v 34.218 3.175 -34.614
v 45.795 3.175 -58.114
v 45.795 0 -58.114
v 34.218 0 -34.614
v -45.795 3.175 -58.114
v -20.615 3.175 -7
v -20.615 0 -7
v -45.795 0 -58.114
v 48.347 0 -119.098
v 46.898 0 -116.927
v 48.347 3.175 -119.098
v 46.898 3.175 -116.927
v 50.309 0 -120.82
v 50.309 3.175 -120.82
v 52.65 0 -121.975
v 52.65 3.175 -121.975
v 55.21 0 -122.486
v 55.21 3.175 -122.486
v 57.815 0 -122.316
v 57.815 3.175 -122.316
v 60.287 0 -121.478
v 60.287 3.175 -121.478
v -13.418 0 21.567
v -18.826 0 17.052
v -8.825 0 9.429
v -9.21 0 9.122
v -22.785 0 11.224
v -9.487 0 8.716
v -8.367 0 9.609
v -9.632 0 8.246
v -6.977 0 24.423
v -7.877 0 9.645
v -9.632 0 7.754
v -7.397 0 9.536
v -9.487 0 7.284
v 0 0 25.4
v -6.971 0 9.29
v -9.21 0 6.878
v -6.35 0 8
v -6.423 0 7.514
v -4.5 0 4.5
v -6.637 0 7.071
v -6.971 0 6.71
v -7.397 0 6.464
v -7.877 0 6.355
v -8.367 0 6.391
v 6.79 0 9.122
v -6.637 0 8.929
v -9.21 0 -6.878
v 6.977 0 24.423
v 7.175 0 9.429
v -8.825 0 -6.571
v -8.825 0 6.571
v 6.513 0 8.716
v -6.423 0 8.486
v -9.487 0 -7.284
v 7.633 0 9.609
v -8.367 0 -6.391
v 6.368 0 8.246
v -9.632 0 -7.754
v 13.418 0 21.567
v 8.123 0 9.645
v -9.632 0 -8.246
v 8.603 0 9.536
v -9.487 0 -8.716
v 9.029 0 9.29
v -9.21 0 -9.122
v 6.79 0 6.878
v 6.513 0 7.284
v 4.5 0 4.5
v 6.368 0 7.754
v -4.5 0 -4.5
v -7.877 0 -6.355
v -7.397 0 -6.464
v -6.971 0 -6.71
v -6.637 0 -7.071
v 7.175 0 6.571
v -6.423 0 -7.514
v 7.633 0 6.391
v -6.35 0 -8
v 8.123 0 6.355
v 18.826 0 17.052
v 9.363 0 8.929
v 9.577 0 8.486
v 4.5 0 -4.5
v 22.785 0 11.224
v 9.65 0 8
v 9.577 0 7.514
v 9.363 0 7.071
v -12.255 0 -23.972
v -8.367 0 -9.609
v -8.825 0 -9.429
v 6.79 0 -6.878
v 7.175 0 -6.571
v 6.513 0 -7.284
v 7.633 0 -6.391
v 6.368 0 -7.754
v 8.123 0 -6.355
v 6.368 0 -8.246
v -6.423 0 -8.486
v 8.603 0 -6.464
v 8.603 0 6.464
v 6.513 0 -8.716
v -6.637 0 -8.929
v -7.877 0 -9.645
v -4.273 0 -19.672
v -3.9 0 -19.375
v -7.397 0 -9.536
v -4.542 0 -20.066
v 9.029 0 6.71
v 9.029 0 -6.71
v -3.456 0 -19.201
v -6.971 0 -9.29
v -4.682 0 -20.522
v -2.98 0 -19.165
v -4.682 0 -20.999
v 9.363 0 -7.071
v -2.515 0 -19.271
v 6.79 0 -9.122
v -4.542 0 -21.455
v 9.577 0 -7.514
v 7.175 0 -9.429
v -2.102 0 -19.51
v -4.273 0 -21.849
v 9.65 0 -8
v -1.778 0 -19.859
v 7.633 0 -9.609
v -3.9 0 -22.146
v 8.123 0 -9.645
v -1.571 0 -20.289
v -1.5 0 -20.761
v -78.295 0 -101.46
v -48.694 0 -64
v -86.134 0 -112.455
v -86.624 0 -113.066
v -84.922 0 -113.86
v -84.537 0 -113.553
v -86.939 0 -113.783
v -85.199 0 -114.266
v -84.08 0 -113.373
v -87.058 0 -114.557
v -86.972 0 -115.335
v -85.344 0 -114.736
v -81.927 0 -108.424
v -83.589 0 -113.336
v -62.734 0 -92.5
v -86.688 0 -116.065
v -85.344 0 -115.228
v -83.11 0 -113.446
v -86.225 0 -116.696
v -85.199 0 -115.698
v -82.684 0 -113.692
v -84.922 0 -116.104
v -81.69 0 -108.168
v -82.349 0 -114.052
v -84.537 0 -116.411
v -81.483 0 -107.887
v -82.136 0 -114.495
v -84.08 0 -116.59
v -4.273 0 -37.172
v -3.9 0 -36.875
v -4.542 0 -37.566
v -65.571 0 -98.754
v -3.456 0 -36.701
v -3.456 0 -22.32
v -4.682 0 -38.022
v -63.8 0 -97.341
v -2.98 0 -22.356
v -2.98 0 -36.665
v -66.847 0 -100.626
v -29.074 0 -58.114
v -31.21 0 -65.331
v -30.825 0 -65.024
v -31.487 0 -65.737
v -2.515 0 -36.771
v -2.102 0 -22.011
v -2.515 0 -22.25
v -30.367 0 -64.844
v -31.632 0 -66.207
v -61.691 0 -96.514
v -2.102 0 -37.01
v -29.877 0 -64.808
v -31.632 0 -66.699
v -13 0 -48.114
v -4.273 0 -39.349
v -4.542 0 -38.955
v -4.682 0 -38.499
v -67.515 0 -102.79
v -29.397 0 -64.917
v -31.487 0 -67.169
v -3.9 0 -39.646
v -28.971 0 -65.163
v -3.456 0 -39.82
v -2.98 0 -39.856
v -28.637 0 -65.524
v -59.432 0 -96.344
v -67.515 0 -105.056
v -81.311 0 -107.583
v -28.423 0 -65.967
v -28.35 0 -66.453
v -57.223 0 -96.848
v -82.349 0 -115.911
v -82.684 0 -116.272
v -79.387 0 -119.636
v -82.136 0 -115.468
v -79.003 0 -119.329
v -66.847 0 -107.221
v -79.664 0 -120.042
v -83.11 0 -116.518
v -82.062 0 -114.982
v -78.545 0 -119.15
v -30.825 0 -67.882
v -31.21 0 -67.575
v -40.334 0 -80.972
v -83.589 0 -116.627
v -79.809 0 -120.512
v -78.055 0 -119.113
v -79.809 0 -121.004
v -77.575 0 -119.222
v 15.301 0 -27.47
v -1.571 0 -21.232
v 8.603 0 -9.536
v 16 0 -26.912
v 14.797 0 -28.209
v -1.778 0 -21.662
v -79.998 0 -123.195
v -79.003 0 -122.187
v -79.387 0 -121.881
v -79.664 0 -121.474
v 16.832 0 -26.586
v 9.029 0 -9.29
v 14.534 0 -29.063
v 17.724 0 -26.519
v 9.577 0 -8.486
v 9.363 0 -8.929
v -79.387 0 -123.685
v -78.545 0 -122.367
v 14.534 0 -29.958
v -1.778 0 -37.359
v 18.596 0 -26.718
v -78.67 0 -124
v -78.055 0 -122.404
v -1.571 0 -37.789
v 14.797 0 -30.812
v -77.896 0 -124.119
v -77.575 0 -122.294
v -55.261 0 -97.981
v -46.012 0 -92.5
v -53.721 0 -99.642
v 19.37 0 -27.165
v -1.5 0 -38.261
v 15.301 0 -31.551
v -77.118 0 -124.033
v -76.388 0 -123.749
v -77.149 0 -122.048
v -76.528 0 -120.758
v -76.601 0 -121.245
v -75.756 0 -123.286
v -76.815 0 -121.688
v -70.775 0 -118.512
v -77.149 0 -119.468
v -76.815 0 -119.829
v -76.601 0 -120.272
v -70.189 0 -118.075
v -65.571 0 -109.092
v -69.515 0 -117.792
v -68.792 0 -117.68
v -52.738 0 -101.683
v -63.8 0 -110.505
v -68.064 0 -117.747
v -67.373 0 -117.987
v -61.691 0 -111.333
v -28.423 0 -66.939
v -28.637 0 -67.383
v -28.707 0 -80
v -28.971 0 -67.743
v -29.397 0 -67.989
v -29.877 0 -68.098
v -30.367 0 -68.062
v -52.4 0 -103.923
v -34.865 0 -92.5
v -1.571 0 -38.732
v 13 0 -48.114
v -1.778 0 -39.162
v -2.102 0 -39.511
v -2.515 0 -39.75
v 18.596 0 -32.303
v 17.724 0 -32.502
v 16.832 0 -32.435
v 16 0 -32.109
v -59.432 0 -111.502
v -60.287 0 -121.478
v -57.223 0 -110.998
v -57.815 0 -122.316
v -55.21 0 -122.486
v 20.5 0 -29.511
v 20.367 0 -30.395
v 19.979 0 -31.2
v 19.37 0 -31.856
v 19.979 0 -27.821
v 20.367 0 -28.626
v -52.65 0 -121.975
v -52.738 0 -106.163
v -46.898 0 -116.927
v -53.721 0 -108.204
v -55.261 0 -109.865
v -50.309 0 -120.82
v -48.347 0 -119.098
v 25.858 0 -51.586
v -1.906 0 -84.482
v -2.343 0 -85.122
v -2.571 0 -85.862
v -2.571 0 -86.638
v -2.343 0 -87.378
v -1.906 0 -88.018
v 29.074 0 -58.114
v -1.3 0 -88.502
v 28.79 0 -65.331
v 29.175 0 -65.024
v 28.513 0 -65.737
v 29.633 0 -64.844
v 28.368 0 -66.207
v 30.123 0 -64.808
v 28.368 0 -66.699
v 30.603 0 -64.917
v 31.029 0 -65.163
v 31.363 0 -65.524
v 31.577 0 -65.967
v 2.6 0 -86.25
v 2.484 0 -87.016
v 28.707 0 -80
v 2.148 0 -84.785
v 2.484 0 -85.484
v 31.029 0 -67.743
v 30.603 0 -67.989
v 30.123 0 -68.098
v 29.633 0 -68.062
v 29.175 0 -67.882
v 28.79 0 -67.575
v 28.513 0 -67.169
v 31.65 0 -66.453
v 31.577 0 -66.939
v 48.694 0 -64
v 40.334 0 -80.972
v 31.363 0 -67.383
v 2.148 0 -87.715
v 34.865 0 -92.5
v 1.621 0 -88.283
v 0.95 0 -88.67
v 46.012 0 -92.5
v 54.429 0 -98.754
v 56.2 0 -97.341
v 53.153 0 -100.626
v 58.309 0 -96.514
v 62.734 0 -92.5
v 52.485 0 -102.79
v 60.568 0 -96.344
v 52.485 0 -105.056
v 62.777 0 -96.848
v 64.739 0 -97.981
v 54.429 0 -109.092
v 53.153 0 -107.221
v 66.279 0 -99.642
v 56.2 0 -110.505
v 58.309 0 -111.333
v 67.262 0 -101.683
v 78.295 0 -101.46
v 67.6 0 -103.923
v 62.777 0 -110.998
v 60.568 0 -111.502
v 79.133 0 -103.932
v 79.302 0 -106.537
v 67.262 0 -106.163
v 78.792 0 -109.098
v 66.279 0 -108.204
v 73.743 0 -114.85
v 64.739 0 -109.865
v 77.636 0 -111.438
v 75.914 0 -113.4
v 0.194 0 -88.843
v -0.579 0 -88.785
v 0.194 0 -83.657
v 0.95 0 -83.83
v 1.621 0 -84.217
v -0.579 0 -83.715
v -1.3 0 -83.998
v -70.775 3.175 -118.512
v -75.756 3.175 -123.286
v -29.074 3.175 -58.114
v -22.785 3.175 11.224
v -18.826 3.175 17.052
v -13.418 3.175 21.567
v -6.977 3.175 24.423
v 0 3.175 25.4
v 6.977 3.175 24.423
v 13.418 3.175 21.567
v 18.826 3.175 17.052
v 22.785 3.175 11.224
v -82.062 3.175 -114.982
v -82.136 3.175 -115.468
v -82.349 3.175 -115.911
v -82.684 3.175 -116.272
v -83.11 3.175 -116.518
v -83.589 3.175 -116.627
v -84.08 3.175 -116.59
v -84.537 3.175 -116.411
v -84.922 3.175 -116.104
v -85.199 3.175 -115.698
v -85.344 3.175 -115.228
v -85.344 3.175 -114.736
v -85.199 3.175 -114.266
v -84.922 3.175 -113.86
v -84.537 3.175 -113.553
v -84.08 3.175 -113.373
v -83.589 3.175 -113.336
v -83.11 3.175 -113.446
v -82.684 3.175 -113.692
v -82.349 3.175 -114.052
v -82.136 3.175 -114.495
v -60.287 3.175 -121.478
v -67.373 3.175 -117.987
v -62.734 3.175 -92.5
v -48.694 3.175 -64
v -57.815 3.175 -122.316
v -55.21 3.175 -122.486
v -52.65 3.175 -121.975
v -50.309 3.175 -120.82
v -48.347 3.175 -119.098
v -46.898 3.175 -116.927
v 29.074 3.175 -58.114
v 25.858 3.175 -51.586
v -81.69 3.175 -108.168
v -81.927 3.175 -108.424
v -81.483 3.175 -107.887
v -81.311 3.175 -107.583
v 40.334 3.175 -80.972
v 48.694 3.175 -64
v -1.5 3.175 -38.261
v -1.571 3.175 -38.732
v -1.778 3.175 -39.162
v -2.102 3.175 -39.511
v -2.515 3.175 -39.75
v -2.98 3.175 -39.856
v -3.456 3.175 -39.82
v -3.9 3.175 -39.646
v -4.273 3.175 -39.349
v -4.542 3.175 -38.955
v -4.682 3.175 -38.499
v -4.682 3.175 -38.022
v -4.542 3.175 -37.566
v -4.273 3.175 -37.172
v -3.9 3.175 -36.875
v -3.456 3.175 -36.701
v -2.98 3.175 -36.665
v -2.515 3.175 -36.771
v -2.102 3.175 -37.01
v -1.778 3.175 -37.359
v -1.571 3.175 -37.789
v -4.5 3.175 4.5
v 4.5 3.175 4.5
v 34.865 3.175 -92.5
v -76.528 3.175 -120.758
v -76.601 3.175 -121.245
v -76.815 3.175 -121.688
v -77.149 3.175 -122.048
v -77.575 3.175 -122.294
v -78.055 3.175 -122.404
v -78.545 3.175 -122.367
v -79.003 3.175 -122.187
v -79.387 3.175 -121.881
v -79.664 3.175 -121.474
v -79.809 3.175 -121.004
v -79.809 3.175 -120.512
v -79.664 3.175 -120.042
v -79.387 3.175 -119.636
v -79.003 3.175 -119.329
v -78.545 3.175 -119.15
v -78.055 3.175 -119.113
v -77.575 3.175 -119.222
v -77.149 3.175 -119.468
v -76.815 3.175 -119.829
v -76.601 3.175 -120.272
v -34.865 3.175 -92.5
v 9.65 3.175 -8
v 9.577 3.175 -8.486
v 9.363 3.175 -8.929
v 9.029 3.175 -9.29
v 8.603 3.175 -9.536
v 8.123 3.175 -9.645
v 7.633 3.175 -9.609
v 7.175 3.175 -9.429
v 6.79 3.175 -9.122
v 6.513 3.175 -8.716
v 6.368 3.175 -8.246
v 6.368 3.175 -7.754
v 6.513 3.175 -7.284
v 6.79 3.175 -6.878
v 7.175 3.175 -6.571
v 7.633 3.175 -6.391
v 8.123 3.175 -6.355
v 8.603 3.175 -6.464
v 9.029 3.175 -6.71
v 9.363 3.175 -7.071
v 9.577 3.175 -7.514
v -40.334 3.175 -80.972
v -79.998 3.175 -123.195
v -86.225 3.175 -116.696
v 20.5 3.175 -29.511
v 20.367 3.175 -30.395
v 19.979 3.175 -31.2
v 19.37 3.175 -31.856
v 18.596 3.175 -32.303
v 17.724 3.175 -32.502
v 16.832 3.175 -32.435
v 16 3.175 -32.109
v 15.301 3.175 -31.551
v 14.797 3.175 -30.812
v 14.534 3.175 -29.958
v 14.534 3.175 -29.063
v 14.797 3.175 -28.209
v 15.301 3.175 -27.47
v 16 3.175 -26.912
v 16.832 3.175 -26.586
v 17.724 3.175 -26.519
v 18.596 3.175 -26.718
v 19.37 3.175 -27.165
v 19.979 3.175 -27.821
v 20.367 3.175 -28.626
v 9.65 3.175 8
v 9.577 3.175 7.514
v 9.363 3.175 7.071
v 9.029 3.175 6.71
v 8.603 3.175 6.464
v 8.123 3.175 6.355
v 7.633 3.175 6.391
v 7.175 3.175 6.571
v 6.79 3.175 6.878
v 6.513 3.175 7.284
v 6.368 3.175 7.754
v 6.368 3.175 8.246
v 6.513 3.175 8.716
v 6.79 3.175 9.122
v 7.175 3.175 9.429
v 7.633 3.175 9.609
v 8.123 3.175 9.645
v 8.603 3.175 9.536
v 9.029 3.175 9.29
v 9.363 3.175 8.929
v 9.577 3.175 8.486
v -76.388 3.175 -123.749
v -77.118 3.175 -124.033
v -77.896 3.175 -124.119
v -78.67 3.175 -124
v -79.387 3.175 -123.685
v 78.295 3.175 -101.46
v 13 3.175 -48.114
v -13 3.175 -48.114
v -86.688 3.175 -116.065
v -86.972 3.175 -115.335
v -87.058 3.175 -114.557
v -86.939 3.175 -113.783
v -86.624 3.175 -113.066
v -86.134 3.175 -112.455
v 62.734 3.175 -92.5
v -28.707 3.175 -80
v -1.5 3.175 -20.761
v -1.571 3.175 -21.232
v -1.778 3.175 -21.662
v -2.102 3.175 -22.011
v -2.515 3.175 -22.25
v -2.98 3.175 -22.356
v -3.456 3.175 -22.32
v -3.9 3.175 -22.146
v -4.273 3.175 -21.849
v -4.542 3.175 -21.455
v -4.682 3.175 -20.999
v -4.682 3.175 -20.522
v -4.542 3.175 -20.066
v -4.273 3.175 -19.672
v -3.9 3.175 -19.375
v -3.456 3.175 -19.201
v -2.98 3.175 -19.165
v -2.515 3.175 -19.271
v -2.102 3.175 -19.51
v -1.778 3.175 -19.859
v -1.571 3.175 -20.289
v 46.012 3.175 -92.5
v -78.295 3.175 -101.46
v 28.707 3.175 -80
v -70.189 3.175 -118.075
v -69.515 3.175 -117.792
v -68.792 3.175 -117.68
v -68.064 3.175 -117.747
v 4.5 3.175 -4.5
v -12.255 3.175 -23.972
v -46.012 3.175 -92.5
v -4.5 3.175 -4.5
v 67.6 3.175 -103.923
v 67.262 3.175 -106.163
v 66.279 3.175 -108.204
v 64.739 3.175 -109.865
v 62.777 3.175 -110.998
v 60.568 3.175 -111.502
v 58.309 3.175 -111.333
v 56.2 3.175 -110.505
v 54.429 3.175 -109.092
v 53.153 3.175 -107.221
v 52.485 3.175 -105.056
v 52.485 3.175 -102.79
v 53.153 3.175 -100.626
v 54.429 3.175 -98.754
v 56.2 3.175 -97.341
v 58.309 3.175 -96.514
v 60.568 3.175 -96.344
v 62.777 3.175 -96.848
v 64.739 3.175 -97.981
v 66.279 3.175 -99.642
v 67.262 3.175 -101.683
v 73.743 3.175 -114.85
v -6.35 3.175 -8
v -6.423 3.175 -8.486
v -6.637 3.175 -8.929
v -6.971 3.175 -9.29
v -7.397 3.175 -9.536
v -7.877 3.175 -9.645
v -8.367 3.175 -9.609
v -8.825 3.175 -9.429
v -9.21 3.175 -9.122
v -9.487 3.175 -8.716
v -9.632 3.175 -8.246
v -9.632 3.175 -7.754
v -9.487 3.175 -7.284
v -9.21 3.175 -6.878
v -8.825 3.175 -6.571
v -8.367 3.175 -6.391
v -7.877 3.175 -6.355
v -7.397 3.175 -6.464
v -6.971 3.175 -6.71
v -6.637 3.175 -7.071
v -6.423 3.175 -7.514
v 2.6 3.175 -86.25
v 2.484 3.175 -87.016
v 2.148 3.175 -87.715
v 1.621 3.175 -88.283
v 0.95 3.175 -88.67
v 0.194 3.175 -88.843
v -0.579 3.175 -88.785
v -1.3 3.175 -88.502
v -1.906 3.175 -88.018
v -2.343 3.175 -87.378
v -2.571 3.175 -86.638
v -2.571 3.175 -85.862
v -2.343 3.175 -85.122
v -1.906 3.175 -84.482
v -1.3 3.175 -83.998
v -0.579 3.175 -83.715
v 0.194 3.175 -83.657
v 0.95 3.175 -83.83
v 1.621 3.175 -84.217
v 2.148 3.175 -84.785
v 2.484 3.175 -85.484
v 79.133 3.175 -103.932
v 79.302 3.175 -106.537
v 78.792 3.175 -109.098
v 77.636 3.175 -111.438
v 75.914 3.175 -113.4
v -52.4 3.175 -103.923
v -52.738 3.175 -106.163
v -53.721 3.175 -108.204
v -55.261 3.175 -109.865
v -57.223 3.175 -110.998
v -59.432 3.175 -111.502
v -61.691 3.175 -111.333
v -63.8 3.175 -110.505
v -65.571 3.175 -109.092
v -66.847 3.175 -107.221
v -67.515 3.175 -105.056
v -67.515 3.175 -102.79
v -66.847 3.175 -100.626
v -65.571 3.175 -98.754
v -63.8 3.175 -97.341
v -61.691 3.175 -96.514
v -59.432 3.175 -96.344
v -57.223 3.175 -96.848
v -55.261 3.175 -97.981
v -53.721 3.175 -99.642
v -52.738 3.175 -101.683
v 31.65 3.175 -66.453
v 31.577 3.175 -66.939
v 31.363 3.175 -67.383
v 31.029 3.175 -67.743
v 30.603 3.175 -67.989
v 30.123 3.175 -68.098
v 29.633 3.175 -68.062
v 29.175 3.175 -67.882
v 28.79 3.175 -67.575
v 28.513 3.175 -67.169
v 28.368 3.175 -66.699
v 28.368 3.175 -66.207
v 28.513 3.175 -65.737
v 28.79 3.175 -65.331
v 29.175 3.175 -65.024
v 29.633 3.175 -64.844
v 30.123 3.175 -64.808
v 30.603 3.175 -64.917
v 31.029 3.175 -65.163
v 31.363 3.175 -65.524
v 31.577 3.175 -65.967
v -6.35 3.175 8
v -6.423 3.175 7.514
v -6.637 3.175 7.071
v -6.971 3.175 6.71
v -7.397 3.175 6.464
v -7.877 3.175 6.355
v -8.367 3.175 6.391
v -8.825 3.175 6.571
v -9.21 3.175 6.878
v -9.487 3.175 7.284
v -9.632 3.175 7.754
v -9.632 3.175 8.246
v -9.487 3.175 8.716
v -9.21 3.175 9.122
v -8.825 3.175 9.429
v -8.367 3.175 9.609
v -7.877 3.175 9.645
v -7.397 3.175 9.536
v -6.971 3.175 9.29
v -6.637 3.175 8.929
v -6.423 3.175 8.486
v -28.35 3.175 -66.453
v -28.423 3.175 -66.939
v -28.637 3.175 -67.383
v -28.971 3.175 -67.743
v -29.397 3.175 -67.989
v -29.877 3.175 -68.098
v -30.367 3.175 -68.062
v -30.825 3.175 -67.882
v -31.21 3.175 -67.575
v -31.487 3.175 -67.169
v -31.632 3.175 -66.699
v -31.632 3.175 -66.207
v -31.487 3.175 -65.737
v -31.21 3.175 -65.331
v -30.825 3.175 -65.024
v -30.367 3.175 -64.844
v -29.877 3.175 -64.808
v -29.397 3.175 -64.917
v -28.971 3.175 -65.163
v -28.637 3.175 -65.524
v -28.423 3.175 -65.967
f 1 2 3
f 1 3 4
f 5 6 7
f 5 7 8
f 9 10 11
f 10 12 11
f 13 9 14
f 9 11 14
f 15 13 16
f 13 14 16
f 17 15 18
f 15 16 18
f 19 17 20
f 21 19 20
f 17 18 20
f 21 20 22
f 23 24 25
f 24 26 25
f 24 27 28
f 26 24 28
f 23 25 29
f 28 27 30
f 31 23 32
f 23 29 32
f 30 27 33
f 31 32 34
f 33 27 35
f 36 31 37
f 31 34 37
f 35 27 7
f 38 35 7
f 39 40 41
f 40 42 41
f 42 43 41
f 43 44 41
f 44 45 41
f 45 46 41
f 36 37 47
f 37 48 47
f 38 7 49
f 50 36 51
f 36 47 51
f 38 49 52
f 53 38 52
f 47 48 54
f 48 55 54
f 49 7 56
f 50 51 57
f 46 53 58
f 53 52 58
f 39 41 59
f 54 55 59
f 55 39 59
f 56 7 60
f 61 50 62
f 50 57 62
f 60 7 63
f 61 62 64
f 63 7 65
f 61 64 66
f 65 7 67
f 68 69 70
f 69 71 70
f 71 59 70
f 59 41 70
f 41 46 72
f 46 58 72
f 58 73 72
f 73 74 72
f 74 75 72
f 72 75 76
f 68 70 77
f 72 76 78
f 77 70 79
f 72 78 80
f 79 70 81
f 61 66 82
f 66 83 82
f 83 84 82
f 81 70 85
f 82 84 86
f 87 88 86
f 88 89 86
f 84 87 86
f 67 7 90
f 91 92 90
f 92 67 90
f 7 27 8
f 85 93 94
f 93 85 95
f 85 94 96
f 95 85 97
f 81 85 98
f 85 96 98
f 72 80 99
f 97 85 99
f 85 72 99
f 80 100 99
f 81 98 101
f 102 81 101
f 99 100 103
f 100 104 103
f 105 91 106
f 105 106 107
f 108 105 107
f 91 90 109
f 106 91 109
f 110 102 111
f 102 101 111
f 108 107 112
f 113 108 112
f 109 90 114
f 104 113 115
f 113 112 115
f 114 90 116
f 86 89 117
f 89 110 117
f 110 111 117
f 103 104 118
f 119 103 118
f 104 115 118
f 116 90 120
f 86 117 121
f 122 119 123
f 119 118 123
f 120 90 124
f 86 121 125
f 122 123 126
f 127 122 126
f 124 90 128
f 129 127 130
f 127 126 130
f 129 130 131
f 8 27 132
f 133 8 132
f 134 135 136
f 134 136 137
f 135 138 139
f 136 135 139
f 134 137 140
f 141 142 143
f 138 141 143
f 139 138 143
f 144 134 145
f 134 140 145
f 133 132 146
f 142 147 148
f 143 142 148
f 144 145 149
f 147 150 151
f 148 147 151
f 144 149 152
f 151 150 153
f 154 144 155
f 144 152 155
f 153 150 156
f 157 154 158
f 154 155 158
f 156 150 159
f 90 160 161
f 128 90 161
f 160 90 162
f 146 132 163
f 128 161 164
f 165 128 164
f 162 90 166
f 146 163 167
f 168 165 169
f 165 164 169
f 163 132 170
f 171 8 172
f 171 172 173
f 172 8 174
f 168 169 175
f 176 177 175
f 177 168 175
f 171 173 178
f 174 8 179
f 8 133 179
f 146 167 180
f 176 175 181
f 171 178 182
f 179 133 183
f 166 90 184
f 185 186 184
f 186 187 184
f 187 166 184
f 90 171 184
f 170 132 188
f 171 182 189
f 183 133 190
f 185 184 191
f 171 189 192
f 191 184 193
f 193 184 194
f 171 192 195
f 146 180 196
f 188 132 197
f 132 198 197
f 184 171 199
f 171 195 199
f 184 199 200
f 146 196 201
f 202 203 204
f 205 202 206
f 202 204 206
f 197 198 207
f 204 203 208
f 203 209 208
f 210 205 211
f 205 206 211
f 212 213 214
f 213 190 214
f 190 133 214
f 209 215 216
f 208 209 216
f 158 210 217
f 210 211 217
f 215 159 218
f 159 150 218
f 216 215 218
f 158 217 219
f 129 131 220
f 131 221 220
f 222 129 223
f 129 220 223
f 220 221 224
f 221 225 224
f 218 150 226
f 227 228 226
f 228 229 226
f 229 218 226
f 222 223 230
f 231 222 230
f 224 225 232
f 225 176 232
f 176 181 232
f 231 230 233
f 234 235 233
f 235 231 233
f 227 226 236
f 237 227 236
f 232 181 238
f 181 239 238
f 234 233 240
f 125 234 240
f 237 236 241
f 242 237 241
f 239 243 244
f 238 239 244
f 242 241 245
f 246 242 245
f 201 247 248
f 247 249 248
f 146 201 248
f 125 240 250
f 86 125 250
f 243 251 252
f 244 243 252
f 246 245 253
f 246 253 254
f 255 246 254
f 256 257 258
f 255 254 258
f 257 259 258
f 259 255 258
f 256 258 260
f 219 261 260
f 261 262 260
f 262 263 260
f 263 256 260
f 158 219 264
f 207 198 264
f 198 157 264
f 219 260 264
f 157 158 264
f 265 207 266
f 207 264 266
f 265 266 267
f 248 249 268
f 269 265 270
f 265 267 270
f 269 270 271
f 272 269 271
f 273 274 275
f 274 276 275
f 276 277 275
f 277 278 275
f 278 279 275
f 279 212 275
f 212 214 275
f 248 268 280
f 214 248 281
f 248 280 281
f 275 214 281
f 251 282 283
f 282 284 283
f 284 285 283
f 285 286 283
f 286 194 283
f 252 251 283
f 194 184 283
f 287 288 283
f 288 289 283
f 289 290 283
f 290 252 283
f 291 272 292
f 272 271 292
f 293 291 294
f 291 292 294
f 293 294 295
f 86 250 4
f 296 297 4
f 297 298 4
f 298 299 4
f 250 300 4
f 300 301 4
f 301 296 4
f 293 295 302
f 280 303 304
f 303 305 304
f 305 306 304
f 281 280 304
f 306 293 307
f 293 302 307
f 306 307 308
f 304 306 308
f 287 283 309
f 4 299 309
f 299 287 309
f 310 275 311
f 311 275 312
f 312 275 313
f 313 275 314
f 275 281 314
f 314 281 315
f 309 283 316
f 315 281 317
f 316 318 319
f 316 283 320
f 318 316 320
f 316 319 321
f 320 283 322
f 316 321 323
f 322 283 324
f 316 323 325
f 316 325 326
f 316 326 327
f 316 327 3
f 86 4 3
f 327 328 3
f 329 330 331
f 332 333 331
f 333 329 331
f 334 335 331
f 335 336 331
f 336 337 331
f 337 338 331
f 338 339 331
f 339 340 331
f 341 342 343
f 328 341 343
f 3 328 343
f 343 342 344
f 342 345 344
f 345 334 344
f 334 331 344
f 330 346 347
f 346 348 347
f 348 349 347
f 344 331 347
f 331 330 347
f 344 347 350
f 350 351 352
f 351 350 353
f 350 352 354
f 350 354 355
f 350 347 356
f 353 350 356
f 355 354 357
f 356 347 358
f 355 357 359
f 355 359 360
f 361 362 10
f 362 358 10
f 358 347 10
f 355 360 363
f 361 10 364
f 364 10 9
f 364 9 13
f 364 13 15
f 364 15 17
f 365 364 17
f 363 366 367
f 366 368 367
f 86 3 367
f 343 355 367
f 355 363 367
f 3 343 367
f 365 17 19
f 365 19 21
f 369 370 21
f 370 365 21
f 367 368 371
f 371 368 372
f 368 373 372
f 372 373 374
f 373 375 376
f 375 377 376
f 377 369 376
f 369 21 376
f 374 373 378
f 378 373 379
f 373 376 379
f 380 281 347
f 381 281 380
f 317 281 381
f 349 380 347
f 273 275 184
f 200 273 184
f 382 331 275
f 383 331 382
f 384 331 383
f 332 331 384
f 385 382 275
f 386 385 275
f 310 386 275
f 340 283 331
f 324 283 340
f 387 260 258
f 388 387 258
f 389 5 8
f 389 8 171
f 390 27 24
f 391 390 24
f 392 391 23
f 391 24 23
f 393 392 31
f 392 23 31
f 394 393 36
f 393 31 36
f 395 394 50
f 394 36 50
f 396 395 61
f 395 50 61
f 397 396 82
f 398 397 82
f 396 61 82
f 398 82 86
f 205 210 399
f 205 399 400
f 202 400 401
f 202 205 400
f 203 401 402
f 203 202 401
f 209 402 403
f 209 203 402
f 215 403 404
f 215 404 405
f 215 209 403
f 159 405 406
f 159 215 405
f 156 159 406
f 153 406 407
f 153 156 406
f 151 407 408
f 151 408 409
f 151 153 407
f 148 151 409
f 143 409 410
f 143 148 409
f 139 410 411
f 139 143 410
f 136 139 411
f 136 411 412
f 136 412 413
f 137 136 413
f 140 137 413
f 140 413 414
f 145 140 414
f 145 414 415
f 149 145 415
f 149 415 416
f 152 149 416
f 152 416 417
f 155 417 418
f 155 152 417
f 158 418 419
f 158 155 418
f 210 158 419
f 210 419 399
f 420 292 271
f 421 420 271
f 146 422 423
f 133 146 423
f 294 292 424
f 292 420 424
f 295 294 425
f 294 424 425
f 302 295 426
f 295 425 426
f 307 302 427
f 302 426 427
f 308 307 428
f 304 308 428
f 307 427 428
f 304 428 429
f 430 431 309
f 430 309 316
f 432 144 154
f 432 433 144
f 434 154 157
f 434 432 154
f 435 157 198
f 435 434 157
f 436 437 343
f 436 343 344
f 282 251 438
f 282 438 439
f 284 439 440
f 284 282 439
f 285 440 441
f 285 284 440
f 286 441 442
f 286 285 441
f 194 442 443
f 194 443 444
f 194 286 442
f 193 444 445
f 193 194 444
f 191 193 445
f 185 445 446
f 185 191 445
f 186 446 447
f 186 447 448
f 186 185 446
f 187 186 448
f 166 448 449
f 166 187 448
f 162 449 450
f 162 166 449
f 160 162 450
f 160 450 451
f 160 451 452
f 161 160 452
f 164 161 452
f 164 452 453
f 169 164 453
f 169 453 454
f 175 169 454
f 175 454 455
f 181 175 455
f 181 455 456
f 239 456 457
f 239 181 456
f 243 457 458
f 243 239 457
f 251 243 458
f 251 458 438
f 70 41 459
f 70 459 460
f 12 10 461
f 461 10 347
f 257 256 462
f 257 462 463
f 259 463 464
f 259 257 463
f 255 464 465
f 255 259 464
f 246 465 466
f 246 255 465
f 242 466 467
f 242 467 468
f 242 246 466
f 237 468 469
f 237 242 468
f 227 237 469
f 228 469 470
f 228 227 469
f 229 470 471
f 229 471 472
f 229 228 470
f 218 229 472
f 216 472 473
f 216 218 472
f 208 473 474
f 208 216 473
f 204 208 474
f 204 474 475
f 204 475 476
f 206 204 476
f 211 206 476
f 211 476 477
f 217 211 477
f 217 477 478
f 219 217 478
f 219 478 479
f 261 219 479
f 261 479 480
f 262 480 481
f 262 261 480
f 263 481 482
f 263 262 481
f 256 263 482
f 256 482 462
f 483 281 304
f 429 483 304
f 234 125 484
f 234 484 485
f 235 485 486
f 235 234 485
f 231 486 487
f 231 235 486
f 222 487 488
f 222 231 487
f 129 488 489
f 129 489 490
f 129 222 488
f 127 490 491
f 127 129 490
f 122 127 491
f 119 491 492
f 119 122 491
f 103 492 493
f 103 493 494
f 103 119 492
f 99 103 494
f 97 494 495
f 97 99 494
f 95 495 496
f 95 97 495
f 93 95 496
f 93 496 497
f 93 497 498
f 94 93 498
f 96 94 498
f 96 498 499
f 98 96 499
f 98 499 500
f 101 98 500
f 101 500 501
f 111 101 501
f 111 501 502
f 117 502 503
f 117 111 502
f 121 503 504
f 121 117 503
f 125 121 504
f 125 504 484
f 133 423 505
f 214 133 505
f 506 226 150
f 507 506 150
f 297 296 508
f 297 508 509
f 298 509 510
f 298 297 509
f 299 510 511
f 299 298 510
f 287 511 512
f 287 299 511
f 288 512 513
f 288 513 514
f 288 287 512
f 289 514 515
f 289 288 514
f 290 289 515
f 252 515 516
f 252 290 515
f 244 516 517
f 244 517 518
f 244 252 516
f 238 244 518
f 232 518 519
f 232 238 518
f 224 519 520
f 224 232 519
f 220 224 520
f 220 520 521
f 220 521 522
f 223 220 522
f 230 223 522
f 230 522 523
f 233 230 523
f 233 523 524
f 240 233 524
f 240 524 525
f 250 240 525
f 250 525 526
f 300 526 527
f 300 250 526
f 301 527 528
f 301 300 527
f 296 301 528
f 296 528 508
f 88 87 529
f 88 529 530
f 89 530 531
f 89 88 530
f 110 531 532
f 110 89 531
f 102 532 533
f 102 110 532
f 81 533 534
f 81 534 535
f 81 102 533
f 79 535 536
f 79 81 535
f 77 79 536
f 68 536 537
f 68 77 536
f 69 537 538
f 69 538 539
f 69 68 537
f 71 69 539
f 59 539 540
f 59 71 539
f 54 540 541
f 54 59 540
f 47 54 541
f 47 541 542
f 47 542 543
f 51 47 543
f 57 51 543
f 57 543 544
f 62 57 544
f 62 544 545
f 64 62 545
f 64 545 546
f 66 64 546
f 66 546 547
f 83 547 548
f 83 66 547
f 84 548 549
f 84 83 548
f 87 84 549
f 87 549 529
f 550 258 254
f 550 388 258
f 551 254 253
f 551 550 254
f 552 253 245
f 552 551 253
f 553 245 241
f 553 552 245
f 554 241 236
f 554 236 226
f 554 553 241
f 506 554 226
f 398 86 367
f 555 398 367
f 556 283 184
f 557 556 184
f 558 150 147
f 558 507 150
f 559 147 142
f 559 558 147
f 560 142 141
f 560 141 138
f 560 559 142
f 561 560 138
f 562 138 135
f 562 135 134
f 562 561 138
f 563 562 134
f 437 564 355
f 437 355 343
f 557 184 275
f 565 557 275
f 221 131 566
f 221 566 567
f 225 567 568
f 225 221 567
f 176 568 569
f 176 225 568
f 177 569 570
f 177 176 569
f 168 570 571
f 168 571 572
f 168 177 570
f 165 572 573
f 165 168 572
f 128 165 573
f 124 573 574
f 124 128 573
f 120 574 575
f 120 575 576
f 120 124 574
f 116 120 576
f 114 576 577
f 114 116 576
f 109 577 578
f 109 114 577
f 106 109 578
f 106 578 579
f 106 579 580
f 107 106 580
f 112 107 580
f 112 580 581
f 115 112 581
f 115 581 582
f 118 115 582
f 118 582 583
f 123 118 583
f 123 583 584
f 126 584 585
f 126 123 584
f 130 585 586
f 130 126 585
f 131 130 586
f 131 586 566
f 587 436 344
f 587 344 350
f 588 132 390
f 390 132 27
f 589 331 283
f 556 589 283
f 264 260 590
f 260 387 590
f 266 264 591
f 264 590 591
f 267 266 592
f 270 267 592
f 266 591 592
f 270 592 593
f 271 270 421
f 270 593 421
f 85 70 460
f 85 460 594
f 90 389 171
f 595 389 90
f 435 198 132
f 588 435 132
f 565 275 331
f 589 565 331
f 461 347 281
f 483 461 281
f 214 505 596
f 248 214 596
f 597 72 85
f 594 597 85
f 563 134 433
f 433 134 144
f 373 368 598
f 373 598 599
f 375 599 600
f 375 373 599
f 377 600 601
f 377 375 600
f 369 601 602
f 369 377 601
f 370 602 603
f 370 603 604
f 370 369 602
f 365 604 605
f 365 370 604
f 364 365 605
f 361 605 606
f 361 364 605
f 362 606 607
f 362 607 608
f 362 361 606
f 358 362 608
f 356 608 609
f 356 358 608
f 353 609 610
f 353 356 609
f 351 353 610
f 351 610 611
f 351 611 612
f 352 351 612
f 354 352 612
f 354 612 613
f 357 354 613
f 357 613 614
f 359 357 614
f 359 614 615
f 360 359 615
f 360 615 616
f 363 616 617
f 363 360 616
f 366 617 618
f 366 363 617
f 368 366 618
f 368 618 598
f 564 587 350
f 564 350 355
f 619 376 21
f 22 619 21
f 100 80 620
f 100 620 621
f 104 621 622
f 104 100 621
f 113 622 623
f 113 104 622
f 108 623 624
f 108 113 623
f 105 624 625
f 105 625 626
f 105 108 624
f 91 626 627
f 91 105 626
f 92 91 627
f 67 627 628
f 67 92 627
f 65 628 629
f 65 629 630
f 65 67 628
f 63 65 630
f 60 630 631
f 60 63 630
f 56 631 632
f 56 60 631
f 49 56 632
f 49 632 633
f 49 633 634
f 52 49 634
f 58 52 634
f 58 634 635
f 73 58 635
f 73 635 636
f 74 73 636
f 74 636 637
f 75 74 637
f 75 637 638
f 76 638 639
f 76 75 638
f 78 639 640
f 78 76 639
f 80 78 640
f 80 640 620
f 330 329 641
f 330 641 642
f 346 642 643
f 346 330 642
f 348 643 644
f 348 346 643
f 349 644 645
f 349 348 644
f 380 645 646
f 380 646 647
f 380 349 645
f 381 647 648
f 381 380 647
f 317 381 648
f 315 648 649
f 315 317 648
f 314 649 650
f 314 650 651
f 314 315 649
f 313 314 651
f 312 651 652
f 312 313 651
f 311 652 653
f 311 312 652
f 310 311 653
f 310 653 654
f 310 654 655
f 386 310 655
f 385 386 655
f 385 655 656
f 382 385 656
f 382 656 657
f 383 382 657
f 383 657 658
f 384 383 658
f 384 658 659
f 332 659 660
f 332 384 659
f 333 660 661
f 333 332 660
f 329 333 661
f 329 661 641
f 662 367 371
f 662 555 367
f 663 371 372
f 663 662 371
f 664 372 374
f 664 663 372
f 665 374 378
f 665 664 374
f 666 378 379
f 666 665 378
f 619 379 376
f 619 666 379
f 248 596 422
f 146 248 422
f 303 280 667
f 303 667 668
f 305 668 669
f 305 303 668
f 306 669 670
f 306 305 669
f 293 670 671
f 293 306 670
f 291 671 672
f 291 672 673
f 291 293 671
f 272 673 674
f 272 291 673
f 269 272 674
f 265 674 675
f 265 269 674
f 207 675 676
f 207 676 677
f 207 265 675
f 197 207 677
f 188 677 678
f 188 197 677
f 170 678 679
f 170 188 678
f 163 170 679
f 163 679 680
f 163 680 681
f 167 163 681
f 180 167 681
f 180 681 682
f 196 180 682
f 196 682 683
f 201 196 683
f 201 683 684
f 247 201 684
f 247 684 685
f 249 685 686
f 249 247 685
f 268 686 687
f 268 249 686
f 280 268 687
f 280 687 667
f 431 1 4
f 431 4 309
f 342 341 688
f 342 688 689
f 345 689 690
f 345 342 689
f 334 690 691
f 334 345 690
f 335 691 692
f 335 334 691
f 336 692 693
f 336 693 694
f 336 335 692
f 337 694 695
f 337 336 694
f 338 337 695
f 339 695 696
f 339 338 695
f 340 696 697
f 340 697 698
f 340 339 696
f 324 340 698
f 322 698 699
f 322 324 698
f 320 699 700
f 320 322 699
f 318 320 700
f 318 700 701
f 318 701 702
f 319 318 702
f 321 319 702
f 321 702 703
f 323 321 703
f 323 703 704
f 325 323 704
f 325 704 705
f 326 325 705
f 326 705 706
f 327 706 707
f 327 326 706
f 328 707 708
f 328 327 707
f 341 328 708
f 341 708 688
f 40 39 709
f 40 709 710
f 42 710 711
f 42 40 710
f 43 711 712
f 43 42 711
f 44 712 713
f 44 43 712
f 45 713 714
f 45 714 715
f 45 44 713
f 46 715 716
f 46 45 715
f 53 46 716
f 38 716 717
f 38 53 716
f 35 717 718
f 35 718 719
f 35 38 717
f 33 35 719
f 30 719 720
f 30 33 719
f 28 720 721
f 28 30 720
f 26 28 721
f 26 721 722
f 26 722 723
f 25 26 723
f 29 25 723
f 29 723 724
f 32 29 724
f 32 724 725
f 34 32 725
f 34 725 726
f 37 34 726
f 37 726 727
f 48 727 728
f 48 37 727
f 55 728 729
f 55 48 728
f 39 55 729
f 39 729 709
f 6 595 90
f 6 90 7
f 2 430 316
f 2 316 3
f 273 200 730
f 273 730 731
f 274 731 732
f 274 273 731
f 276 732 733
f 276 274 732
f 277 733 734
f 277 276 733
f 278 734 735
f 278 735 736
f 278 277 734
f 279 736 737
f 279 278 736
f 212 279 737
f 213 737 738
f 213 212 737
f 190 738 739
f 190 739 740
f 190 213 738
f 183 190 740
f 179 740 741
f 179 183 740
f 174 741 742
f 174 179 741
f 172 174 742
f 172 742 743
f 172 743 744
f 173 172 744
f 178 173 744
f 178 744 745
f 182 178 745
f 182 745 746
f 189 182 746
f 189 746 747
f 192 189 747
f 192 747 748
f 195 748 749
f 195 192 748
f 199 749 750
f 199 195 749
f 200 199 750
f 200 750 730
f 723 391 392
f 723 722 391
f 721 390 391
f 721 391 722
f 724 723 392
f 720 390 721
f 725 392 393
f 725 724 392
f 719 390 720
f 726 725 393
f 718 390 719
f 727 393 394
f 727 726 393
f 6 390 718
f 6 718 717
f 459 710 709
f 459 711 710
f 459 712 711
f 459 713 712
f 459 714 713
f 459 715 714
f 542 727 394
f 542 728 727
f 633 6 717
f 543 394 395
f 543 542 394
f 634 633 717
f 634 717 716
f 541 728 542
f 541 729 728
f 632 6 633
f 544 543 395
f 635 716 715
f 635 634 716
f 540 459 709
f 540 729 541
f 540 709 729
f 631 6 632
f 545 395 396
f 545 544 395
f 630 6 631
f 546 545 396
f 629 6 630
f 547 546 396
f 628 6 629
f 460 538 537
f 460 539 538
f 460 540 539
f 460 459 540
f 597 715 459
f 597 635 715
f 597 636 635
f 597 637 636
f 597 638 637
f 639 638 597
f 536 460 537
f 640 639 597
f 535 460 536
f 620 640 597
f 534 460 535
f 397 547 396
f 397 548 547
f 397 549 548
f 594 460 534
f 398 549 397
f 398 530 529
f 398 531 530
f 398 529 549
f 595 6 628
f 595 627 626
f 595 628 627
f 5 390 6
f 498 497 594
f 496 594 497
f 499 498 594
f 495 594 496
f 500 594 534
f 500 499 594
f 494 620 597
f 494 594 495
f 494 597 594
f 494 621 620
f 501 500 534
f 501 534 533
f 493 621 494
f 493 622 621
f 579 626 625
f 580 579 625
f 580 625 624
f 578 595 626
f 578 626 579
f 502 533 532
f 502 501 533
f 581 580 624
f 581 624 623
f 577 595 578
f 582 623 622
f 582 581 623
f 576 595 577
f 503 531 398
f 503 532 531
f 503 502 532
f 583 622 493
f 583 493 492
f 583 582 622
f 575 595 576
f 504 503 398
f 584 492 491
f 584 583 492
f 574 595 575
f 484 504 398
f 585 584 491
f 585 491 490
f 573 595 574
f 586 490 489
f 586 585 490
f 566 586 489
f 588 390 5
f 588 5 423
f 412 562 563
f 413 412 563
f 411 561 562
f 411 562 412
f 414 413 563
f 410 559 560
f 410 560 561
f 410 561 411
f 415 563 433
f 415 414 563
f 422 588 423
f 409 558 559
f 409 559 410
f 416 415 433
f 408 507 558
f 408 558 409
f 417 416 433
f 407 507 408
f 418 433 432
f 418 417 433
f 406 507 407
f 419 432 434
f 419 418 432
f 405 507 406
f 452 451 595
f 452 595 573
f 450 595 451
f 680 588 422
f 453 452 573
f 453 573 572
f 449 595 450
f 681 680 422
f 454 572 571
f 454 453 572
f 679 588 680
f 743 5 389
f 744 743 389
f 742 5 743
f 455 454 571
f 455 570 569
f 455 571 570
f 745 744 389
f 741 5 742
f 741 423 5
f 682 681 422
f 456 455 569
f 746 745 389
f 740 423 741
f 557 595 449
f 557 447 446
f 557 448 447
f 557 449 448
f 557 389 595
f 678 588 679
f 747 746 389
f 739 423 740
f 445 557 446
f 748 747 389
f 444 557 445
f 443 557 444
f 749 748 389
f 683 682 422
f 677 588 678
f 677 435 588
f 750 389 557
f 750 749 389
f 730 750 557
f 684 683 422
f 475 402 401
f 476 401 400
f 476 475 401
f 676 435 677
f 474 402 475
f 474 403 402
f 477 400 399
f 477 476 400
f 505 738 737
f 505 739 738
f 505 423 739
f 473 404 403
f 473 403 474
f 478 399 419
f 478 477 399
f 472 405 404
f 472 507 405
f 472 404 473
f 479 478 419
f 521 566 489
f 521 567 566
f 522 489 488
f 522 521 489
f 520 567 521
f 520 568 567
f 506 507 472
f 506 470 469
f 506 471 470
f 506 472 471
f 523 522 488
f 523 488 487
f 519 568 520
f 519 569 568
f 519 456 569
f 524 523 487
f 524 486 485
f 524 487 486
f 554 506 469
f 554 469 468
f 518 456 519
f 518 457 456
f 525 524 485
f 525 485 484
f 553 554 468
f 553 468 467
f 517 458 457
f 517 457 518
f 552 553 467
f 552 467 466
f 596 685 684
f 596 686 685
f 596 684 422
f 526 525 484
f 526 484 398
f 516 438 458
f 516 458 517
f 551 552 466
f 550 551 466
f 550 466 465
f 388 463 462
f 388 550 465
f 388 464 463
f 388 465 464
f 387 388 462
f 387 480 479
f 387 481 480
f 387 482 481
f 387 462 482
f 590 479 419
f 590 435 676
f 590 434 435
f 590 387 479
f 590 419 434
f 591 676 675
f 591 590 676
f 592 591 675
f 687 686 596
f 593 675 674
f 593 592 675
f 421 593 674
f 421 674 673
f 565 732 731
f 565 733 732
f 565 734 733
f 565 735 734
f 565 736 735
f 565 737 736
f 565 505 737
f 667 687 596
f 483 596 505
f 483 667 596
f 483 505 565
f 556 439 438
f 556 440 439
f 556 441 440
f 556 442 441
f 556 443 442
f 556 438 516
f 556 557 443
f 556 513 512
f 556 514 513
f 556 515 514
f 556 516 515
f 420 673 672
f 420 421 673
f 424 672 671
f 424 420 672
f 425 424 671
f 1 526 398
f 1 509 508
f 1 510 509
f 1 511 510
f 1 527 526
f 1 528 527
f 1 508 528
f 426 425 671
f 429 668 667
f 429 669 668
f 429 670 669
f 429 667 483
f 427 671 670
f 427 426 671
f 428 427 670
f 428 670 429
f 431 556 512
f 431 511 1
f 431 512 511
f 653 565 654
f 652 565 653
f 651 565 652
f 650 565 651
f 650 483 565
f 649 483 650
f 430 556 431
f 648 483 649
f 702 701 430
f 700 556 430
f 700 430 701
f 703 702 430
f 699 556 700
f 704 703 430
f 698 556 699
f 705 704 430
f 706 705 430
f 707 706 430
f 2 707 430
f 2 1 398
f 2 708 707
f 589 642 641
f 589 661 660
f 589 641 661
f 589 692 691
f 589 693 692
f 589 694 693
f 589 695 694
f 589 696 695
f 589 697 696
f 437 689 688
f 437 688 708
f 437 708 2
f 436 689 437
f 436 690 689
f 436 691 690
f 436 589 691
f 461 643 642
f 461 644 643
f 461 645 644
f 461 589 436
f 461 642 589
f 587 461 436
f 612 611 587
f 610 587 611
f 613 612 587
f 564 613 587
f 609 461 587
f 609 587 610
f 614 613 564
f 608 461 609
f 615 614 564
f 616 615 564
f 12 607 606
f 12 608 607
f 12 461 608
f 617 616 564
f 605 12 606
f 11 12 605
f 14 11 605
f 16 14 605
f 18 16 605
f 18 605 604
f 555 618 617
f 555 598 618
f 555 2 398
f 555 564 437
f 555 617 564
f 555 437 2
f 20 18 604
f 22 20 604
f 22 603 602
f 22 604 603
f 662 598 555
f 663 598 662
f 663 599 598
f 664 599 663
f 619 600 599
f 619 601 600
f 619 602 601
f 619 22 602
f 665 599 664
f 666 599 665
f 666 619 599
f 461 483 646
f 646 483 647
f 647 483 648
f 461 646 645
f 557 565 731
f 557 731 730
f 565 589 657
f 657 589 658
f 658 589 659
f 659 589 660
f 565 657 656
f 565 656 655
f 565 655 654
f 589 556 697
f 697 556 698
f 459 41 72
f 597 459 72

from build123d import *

# Parameters (mm, degrees)
SKETCH1_R               = 1.65
SKETCH1_W               = 9
SKETCH1_H               = 9
SKETCH1_R_2             = 1.6
SKETCH1_R_3             = 3
SKETCH1_R_4             = 7.6
SKETCH1_R_5             = 2.6
BOSS_EXTRUDE1_DEPTH     = 3.175
FILLET1_R               = 10
CUT_EXTRUDE1_DEPTH      = 1
CUT_EXTRUDE1_DEPTH_BACK = 4.175
SKETCH3_R               = 1.65
BOSS_EXTRUDE2_DEPTH     = 3.175
FILLET2_R               = 3


with BuildPart() as part:
    # Sketch1 → Boss-Extrude1 (new body)
    with BuildSketch(Plane(origin=(0, 0, 0), x_dir=(1, 0, 0), z_dir=(0, 1, 0))):
        with BuildLine():
            Line((-51.31658538, 125.897213638), (-82.713802404, 110.430644428))
            Line((-82.713802404, 110.430644428), (-22.785408926, -11.224310227))
            ThreePointArc((-22.785408926, -11.224310227), (0, -25.4), (22.785408926, -11.224310227))
            Line((22.785408926, -11.224310227), (82.713802404, 110.430644428))
            Line((82.713802404, 110.430644428), (51.31658538, 125.897213638))
            Line((51.31658538, 125.897213638), (34.864798721, 92.5))
            Line((34.864798721, 92.5), (-34.864798721, 92.5))
            Line((-34.864798721, 92.5), (-51.31658538, 125.897213638))
        make_face()
        Polygon((-28.707179242, 80), (28.707179242, 80), (13, 48.114343343), (-13, 48.114343343), align=None, mode=Mode.SUBTRACT)
        with Locations((-8, -8)):
            Circle(SKETCH1_R, mode=Mode.SUBTRACT)
        Rectangle(SKETCH1_W, SKETCH1_H, mode=Mode.SUBTRACT)
        with Locations((-8, 8)):
            Circle(SKETCH1_R, mode=Mode.SUBTRACT)
        with Locations((-3.1, 20.76053754)):
            Circle(SKETCH1_R_2, mode=Mode.SUBTRACT)
        with Locations((8, -8)):
            Circle(SKETCH1_R, mode=Mode.SUBTRACT)
        with Locations((8, 8)):
            Circle(SKETCH1_R, mode=Mode.SUBTRACT)
        with Locations((17.5, 29.51053754)):
            Circle(SKETCH1_R_3, mode=Mode.SUBTRACT)
        with Locations((-30, 66.453060464)):
            Circle(SKETCH1_R, mode=Mode.SUBTRACT)
        with Locations((-60, 103.923048454)):
            Circle(SKETCH1_R_4, mode=Mode.SUBTRACT)
        with Locations((30, 66.453060464)):
            Circle(SKETCH1_R, mode=Mode.SUBTRACT)
        with Locations((60, 103.923048454)):
            Circle(SKETCH1_R_4, mode=Mode.SUBTRACT)
        with Locations((0, 86.25)):
            Circle(SKETCH1_R_5, mode=Mode.SUBTRACT)
        with Locations((-3.1, 38.26053754)):
            Circle(SKETCH1_R_2, mode=Mode.SUBTRACT)
    extrude(amount=BOSS_EXTRUDE1_DEPTH)

    # Fillet1
    fillet1_edges = [part.edges().sort_by_distance(p)[0] for p in [
        (51.31658538, 1.5875, -125.897213638),
        (82.713802404, 1.5875, -110.430644428),
        (-82.713802404, 1.5875, -110.430644428),
        (-51.31658538, 1.5875, -125.897213638),
    ]]
    fillet(fillet1_edges, radius=FILLET1_R)

    # Sketch2 → Cut-Extrude1 (cut, two sides)
    with BuildSketch(Plane(origin=(0, 3.175, 0), x_dir=(1, 0, 0), z_dir=(0, 1, 0))) as cut_extrude1_sk:
        Polygon((-45.79480762, 58.114343343), (-29.073580398, 58.114343343), (-12.254779912, 23.972089701), (-20.615393523, 7), align=None)
        Polygon((-62.733510758, 92.5), (-48.694138346, 64), (-40.333524735, 80.972089701), (-46.012283536, 92.5), align=None)
        Polygon((29.073580398, 58.114343343), (45.79480762, 58.114343343), (34.218483, 34.614343343), (25.857869389, 51.586433044), align=None)
        Polygon((46.012283536, 92.5), (62.733510758, 92.5), (48.694138346, 64), (40.333524735, 80.972089701), align=None)
    extrude(amount=CUT_EXTRUDE1_DEPTH, mode=Mode.SUBTRACT)
    extrude(cut_extrude1_sk.sketch, amount=-CUT_EXTRUDE1_DEPTH_BACK, mode=Mode.SUBTRACT)

    # Sketch3 → Boss-Extrude2 (add)
    with BuildSketch(Plane(origin=(0, 0, 0), x_dir=(1, 0, 0), z_dir=(0, 1, 0))):
        with BuildLine():
            Line((-69.257852251, 117.059174089), (-77.922641378, 125.361067209))
            Line((-77.922641378, 125.361067209), (-88.300007778, 114.5300808))
            Line((-88.300007778, 114.5300808), (-81.545013782, 108.057997365))
            Line((-81.545013782, 108.057997365), (-78.29478263, 101.460010992))
            ThreePointArc((-78.29478263, 101.460010992), (-78.792063776, 109.097507652), (-73.743168968, 114.849664202))
            Line((-73.743168968, 114.849664202), (-69.257852251, 117.059174089))
        make_face()
        with Locations((-78.17782959, 120.758363767)):
            Circle(SKETCH3_R, mode=Mode.SUBTRACT)
        with Locations((-83.712425003, 114.981837682)):
            Circle(SKETCH3_R, mode=Mode.SUBTRACT)
    extrude(amount=BOSS_EXTRUDE2_DEPTH)

    # Fillet2
    fillet2_edges = [part.edges().sort_by_distance(p)[0] for p in [
        (-81.545013782, 1.5875, -108.057997365),
        (-88.300007778, 1.5875, -114.5300808),
        (-77.922641378, 1.5875, -125.361067209),
        (-69.257852251, 1.5875, -117.059174089),
    ]]
    fillet(fillet2_edges, radius=FILLET2_R)


solid = part.part
